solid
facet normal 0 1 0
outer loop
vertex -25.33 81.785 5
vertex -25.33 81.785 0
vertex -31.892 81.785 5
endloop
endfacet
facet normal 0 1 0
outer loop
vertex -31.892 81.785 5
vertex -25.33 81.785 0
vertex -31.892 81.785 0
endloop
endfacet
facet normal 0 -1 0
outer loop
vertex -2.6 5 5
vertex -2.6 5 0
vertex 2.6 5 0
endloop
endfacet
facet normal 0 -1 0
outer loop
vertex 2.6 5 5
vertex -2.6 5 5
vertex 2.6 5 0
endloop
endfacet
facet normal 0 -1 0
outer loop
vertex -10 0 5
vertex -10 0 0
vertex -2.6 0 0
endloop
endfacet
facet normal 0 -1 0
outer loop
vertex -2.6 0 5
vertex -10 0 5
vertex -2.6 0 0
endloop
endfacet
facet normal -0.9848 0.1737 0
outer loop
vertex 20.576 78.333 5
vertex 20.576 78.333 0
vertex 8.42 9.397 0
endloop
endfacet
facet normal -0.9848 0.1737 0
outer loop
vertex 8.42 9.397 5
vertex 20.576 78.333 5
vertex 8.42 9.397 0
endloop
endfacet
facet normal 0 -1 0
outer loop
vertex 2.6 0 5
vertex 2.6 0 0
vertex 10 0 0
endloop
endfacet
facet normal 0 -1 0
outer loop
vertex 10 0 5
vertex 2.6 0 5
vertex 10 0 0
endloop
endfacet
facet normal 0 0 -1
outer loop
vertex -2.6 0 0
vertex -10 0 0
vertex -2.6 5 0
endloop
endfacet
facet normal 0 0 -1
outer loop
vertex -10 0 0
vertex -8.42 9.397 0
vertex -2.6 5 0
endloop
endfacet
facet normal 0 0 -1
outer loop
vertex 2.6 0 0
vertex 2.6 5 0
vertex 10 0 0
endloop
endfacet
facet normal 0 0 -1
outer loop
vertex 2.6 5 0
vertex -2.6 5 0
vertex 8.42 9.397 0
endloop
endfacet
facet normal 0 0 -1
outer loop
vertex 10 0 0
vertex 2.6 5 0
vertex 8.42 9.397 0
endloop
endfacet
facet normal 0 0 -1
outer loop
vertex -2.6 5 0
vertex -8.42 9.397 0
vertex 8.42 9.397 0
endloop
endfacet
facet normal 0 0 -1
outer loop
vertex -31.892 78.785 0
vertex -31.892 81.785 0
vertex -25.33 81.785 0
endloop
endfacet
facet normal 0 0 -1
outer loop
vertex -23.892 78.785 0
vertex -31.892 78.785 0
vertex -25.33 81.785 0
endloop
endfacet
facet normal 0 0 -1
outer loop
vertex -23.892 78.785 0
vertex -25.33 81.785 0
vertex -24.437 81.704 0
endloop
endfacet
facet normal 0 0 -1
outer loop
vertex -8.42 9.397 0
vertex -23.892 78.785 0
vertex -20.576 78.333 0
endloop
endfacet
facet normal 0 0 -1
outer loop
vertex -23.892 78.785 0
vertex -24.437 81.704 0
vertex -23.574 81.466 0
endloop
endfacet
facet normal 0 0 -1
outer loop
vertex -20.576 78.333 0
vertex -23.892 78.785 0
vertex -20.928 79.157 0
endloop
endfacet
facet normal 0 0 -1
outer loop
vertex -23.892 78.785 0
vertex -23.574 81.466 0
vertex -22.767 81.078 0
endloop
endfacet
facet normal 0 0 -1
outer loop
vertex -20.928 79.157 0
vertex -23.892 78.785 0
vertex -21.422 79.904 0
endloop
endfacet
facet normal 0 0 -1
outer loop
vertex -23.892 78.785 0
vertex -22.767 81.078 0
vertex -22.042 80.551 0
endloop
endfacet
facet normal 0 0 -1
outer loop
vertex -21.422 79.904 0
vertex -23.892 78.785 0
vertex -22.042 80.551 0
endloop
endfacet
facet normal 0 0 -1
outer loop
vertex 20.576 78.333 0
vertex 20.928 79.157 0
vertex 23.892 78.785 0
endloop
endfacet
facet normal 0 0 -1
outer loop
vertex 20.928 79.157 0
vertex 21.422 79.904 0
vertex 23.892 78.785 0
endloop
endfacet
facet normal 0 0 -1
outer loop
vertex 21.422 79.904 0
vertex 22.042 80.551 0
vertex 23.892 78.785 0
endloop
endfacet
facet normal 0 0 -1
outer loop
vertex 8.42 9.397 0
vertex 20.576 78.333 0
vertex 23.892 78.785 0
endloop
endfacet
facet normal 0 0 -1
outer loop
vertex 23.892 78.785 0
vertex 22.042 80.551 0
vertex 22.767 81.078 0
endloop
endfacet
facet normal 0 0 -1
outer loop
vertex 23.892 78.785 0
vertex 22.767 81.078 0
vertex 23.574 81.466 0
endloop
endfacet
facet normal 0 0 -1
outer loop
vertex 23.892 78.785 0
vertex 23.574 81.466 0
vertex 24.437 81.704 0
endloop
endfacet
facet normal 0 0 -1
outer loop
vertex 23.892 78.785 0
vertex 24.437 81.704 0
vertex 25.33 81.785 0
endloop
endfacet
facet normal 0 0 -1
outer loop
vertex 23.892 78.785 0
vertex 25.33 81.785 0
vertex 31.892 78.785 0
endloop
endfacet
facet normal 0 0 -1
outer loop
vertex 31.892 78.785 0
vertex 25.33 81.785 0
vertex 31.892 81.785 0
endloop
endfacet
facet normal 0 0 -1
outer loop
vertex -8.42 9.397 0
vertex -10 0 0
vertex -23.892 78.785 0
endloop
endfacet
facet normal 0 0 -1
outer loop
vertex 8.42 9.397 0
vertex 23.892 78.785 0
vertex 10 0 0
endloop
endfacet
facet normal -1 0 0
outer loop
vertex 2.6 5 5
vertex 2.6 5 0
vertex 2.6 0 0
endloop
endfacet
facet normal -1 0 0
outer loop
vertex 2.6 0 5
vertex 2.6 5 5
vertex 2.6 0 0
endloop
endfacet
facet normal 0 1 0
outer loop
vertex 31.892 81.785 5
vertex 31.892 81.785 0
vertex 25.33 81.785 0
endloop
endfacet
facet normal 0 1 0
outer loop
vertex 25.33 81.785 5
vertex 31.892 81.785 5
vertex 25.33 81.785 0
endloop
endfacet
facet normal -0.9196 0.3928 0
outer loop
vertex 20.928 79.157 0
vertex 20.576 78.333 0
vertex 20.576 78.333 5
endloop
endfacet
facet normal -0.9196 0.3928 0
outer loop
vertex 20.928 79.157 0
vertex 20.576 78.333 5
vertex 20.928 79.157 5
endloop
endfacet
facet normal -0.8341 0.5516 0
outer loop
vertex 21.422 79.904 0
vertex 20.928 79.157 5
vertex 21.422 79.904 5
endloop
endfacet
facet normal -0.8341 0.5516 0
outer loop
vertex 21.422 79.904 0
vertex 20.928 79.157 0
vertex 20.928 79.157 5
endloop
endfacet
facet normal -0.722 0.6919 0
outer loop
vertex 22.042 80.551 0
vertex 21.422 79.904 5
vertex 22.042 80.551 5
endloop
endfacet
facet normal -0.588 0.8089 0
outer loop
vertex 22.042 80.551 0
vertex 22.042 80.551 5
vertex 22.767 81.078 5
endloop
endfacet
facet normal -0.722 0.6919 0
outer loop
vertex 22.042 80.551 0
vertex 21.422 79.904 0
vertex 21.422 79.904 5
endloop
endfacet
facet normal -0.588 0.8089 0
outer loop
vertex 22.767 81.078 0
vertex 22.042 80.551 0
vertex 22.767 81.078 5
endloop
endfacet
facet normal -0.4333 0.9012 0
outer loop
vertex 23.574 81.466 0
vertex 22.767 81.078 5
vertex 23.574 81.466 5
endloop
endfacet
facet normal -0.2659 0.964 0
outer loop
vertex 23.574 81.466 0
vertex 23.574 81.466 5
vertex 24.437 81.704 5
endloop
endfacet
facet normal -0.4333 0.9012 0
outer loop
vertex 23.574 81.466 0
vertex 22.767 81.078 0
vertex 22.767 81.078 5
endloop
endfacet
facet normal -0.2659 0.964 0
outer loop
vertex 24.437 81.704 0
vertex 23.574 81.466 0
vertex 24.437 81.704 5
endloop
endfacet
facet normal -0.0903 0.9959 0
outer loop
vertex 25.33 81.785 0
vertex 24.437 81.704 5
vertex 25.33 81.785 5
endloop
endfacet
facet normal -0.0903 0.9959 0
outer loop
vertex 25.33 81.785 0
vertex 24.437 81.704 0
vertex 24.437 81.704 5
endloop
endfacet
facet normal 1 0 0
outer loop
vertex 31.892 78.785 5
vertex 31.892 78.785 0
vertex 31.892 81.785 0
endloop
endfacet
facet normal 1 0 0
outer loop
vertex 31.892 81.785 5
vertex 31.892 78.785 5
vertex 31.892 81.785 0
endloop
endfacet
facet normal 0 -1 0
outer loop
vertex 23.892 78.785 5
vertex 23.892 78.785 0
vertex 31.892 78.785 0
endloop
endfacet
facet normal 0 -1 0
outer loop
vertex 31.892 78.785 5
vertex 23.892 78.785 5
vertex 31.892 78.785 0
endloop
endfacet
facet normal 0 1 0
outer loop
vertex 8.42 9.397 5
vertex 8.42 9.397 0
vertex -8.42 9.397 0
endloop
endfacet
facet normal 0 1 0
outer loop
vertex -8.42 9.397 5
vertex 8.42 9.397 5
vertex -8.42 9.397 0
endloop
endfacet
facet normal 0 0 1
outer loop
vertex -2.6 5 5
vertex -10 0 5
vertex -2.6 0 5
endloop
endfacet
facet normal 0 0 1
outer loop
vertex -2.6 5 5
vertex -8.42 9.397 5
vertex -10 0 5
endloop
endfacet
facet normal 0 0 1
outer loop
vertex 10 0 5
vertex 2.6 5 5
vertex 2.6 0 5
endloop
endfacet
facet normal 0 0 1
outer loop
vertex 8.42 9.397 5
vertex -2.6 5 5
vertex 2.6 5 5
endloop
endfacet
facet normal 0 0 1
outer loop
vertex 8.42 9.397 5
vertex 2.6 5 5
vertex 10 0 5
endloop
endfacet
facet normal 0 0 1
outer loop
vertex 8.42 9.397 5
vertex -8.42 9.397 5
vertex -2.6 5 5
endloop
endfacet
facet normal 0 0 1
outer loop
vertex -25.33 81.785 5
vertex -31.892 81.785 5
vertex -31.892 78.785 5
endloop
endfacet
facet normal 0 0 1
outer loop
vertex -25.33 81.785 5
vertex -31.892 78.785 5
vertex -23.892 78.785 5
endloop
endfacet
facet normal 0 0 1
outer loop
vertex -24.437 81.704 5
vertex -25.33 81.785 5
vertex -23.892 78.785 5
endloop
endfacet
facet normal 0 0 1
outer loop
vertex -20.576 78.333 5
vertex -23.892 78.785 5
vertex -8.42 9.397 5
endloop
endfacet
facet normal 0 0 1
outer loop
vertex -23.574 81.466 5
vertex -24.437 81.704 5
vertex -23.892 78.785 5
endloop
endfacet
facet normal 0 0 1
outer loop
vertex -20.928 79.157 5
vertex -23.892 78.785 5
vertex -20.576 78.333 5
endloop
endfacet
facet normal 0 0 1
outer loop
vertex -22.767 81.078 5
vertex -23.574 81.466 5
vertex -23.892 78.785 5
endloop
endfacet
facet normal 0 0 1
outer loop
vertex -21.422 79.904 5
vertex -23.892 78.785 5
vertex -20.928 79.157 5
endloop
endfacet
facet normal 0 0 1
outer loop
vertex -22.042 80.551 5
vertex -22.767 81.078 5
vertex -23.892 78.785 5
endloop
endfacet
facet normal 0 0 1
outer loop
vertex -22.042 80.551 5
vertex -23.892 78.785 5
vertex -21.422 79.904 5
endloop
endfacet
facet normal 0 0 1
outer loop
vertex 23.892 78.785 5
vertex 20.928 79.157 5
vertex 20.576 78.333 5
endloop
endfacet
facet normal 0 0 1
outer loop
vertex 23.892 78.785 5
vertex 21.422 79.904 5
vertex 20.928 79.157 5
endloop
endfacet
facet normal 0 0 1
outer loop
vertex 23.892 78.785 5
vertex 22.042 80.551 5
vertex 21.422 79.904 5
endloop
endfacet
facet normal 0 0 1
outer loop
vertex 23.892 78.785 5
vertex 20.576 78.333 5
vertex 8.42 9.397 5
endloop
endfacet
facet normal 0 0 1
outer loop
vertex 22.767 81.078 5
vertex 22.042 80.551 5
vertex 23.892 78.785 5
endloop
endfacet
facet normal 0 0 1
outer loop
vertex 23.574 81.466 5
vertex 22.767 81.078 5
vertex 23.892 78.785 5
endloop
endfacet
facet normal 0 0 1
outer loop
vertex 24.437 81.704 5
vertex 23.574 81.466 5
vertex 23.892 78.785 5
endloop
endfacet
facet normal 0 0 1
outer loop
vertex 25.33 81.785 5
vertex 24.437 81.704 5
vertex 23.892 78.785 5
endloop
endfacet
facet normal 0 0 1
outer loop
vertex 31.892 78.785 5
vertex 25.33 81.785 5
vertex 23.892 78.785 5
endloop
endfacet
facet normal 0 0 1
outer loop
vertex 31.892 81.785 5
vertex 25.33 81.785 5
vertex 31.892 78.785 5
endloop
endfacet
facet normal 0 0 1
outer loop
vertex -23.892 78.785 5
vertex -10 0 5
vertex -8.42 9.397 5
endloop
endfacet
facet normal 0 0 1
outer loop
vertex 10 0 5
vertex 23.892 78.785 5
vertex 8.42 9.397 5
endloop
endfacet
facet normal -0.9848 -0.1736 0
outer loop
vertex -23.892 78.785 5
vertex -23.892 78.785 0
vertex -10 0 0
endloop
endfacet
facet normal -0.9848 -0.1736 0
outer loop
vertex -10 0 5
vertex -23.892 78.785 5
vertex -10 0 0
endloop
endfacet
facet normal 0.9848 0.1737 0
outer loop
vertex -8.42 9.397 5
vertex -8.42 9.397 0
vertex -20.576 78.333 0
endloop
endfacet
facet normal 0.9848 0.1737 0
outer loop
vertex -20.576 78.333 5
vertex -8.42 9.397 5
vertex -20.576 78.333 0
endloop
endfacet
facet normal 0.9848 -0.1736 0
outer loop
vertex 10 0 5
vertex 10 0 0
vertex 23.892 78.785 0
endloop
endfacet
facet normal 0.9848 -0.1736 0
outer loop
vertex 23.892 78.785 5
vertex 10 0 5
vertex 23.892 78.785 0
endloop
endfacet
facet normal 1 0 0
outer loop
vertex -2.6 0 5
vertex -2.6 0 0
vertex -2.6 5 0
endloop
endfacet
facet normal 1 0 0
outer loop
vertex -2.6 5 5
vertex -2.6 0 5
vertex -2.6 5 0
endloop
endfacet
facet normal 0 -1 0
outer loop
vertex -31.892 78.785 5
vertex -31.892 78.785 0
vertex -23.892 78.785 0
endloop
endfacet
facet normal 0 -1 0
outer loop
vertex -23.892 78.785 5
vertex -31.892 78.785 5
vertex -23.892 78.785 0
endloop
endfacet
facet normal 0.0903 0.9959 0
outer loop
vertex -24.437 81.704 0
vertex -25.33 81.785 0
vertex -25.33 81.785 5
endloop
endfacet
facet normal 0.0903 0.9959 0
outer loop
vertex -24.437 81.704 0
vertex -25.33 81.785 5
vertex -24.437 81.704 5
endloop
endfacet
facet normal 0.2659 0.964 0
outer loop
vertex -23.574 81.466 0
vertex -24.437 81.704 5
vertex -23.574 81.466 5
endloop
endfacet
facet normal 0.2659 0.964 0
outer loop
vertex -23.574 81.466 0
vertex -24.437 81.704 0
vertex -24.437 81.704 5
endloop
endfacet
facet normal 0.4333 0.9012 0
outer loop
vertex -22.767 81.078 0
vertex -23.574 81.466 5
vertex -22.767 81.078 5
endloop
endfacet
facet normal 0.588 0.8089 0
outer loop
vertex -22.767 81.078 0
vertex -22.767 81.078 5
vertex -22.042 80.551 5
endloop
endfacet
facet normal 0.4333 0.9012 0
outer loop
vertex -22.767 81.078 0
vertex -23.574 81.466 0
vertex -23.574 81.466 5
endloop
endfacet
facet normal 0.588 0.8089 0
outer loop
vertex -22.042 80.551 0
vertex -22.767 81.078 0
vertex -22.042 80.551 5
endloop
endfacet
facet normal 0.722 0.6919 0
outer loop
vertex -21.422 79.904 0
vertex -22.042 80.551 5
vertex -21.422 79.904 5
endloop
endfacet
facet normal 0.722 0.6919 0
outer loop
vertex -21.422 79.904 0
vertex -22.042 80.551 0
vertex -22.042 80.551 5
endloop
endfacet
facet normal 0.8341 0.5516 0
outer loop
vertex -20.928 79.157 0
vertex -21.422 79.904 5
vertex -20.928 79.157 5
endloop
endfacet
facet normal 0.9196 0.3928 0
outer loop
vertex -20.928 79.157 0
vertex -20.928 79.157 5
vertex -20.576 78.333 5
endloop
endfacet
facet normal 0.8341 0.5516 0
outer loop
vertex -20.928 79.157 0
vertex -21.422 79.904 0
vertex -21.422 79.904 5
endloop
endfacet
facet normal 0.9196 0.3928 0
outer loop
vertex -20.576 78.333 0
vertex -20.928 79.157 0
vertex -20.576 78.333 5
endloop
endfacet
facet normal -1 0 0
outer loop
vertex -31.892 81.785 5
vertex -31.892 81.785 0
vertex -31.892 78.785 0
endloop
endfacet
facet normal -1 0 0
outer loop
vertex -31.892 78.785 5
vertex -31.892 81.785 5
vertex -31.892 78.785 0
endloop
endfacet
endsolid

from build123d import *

# Parameters (mm, degrees)
F1_DEPTH    = 5
F2_T1_DEPTH = 28.770290161


# Not quite as in the source:
# - a fillet or chamfer that OpenCascade refuses, or shapes differently, is made with other operations: its cross-section is extruded or revolved along the edge and cut away or added


with BuildPart() as f1:
    # F0 (on Top) → F1 (new body)
    with BuildSketch(Plane.XY):
        Polygon((-10, 0), (-2.6, 0), (-2.6, 5), (0, 5), (2.6, 5), (2.6, 0), (10, 0), (23.8918542134, 78.784620241), (31.8918542134, 78.784620241), (31.8918542134, 81.784620241), (20.5755738699, 81.784620241), (20.5755738699, 78.3334689187), (8.4202014333, 9.3969262079), (3.4202014333, 9.3969262079), (0, 9.3969262079), (-8.4202014333, 9.3969262079), (-20.5755738699, 78.3334689187), (-20.5755738699, 81.784620241), (-31.8918542134, 81.784620241), (-31.8918542134, 78.784620241), (-23.8918542134, 78.784620241), align=None)
    extrude(amount=F1_DEPTH)

    # F2: fillet of radius 5 on 2 edges, made by hand

    # F2_s2 → F2_t1 (cut)
    with BuildSketch(Plane.XY.offset(-11.8851450805)):
        with BuildLine():
            ThreePointArc((-25.3296319021, 81.784620241), (-22.3923068766, 80.8308680948), (-20.5755738699, 78.3334689187))
            Line((-20.5755738699, 78.3334689187), (-20.5755738699, 81.784620241))
            Line((-20.5755738699, 81.784620241), (-25.3296319021, 81.784620241))
        make_face()
        with BuildLine():
            ThreePointArc((20.5755738699, 78.3334689187), (22.3923068766, 80.8308680948), (25.3296319021, 81.784620241))
            Line((25.3296319021, 81.784620241), (20.5755738699, 81.784620241))
            Line((20.5755738699, 81.784620241), (20.5755738699, 78.3334689187))
        make_face()
    extrude(amount=F2_T1_DEPTH, mode=Mode.SUBTRACT)


solid = f1.part
